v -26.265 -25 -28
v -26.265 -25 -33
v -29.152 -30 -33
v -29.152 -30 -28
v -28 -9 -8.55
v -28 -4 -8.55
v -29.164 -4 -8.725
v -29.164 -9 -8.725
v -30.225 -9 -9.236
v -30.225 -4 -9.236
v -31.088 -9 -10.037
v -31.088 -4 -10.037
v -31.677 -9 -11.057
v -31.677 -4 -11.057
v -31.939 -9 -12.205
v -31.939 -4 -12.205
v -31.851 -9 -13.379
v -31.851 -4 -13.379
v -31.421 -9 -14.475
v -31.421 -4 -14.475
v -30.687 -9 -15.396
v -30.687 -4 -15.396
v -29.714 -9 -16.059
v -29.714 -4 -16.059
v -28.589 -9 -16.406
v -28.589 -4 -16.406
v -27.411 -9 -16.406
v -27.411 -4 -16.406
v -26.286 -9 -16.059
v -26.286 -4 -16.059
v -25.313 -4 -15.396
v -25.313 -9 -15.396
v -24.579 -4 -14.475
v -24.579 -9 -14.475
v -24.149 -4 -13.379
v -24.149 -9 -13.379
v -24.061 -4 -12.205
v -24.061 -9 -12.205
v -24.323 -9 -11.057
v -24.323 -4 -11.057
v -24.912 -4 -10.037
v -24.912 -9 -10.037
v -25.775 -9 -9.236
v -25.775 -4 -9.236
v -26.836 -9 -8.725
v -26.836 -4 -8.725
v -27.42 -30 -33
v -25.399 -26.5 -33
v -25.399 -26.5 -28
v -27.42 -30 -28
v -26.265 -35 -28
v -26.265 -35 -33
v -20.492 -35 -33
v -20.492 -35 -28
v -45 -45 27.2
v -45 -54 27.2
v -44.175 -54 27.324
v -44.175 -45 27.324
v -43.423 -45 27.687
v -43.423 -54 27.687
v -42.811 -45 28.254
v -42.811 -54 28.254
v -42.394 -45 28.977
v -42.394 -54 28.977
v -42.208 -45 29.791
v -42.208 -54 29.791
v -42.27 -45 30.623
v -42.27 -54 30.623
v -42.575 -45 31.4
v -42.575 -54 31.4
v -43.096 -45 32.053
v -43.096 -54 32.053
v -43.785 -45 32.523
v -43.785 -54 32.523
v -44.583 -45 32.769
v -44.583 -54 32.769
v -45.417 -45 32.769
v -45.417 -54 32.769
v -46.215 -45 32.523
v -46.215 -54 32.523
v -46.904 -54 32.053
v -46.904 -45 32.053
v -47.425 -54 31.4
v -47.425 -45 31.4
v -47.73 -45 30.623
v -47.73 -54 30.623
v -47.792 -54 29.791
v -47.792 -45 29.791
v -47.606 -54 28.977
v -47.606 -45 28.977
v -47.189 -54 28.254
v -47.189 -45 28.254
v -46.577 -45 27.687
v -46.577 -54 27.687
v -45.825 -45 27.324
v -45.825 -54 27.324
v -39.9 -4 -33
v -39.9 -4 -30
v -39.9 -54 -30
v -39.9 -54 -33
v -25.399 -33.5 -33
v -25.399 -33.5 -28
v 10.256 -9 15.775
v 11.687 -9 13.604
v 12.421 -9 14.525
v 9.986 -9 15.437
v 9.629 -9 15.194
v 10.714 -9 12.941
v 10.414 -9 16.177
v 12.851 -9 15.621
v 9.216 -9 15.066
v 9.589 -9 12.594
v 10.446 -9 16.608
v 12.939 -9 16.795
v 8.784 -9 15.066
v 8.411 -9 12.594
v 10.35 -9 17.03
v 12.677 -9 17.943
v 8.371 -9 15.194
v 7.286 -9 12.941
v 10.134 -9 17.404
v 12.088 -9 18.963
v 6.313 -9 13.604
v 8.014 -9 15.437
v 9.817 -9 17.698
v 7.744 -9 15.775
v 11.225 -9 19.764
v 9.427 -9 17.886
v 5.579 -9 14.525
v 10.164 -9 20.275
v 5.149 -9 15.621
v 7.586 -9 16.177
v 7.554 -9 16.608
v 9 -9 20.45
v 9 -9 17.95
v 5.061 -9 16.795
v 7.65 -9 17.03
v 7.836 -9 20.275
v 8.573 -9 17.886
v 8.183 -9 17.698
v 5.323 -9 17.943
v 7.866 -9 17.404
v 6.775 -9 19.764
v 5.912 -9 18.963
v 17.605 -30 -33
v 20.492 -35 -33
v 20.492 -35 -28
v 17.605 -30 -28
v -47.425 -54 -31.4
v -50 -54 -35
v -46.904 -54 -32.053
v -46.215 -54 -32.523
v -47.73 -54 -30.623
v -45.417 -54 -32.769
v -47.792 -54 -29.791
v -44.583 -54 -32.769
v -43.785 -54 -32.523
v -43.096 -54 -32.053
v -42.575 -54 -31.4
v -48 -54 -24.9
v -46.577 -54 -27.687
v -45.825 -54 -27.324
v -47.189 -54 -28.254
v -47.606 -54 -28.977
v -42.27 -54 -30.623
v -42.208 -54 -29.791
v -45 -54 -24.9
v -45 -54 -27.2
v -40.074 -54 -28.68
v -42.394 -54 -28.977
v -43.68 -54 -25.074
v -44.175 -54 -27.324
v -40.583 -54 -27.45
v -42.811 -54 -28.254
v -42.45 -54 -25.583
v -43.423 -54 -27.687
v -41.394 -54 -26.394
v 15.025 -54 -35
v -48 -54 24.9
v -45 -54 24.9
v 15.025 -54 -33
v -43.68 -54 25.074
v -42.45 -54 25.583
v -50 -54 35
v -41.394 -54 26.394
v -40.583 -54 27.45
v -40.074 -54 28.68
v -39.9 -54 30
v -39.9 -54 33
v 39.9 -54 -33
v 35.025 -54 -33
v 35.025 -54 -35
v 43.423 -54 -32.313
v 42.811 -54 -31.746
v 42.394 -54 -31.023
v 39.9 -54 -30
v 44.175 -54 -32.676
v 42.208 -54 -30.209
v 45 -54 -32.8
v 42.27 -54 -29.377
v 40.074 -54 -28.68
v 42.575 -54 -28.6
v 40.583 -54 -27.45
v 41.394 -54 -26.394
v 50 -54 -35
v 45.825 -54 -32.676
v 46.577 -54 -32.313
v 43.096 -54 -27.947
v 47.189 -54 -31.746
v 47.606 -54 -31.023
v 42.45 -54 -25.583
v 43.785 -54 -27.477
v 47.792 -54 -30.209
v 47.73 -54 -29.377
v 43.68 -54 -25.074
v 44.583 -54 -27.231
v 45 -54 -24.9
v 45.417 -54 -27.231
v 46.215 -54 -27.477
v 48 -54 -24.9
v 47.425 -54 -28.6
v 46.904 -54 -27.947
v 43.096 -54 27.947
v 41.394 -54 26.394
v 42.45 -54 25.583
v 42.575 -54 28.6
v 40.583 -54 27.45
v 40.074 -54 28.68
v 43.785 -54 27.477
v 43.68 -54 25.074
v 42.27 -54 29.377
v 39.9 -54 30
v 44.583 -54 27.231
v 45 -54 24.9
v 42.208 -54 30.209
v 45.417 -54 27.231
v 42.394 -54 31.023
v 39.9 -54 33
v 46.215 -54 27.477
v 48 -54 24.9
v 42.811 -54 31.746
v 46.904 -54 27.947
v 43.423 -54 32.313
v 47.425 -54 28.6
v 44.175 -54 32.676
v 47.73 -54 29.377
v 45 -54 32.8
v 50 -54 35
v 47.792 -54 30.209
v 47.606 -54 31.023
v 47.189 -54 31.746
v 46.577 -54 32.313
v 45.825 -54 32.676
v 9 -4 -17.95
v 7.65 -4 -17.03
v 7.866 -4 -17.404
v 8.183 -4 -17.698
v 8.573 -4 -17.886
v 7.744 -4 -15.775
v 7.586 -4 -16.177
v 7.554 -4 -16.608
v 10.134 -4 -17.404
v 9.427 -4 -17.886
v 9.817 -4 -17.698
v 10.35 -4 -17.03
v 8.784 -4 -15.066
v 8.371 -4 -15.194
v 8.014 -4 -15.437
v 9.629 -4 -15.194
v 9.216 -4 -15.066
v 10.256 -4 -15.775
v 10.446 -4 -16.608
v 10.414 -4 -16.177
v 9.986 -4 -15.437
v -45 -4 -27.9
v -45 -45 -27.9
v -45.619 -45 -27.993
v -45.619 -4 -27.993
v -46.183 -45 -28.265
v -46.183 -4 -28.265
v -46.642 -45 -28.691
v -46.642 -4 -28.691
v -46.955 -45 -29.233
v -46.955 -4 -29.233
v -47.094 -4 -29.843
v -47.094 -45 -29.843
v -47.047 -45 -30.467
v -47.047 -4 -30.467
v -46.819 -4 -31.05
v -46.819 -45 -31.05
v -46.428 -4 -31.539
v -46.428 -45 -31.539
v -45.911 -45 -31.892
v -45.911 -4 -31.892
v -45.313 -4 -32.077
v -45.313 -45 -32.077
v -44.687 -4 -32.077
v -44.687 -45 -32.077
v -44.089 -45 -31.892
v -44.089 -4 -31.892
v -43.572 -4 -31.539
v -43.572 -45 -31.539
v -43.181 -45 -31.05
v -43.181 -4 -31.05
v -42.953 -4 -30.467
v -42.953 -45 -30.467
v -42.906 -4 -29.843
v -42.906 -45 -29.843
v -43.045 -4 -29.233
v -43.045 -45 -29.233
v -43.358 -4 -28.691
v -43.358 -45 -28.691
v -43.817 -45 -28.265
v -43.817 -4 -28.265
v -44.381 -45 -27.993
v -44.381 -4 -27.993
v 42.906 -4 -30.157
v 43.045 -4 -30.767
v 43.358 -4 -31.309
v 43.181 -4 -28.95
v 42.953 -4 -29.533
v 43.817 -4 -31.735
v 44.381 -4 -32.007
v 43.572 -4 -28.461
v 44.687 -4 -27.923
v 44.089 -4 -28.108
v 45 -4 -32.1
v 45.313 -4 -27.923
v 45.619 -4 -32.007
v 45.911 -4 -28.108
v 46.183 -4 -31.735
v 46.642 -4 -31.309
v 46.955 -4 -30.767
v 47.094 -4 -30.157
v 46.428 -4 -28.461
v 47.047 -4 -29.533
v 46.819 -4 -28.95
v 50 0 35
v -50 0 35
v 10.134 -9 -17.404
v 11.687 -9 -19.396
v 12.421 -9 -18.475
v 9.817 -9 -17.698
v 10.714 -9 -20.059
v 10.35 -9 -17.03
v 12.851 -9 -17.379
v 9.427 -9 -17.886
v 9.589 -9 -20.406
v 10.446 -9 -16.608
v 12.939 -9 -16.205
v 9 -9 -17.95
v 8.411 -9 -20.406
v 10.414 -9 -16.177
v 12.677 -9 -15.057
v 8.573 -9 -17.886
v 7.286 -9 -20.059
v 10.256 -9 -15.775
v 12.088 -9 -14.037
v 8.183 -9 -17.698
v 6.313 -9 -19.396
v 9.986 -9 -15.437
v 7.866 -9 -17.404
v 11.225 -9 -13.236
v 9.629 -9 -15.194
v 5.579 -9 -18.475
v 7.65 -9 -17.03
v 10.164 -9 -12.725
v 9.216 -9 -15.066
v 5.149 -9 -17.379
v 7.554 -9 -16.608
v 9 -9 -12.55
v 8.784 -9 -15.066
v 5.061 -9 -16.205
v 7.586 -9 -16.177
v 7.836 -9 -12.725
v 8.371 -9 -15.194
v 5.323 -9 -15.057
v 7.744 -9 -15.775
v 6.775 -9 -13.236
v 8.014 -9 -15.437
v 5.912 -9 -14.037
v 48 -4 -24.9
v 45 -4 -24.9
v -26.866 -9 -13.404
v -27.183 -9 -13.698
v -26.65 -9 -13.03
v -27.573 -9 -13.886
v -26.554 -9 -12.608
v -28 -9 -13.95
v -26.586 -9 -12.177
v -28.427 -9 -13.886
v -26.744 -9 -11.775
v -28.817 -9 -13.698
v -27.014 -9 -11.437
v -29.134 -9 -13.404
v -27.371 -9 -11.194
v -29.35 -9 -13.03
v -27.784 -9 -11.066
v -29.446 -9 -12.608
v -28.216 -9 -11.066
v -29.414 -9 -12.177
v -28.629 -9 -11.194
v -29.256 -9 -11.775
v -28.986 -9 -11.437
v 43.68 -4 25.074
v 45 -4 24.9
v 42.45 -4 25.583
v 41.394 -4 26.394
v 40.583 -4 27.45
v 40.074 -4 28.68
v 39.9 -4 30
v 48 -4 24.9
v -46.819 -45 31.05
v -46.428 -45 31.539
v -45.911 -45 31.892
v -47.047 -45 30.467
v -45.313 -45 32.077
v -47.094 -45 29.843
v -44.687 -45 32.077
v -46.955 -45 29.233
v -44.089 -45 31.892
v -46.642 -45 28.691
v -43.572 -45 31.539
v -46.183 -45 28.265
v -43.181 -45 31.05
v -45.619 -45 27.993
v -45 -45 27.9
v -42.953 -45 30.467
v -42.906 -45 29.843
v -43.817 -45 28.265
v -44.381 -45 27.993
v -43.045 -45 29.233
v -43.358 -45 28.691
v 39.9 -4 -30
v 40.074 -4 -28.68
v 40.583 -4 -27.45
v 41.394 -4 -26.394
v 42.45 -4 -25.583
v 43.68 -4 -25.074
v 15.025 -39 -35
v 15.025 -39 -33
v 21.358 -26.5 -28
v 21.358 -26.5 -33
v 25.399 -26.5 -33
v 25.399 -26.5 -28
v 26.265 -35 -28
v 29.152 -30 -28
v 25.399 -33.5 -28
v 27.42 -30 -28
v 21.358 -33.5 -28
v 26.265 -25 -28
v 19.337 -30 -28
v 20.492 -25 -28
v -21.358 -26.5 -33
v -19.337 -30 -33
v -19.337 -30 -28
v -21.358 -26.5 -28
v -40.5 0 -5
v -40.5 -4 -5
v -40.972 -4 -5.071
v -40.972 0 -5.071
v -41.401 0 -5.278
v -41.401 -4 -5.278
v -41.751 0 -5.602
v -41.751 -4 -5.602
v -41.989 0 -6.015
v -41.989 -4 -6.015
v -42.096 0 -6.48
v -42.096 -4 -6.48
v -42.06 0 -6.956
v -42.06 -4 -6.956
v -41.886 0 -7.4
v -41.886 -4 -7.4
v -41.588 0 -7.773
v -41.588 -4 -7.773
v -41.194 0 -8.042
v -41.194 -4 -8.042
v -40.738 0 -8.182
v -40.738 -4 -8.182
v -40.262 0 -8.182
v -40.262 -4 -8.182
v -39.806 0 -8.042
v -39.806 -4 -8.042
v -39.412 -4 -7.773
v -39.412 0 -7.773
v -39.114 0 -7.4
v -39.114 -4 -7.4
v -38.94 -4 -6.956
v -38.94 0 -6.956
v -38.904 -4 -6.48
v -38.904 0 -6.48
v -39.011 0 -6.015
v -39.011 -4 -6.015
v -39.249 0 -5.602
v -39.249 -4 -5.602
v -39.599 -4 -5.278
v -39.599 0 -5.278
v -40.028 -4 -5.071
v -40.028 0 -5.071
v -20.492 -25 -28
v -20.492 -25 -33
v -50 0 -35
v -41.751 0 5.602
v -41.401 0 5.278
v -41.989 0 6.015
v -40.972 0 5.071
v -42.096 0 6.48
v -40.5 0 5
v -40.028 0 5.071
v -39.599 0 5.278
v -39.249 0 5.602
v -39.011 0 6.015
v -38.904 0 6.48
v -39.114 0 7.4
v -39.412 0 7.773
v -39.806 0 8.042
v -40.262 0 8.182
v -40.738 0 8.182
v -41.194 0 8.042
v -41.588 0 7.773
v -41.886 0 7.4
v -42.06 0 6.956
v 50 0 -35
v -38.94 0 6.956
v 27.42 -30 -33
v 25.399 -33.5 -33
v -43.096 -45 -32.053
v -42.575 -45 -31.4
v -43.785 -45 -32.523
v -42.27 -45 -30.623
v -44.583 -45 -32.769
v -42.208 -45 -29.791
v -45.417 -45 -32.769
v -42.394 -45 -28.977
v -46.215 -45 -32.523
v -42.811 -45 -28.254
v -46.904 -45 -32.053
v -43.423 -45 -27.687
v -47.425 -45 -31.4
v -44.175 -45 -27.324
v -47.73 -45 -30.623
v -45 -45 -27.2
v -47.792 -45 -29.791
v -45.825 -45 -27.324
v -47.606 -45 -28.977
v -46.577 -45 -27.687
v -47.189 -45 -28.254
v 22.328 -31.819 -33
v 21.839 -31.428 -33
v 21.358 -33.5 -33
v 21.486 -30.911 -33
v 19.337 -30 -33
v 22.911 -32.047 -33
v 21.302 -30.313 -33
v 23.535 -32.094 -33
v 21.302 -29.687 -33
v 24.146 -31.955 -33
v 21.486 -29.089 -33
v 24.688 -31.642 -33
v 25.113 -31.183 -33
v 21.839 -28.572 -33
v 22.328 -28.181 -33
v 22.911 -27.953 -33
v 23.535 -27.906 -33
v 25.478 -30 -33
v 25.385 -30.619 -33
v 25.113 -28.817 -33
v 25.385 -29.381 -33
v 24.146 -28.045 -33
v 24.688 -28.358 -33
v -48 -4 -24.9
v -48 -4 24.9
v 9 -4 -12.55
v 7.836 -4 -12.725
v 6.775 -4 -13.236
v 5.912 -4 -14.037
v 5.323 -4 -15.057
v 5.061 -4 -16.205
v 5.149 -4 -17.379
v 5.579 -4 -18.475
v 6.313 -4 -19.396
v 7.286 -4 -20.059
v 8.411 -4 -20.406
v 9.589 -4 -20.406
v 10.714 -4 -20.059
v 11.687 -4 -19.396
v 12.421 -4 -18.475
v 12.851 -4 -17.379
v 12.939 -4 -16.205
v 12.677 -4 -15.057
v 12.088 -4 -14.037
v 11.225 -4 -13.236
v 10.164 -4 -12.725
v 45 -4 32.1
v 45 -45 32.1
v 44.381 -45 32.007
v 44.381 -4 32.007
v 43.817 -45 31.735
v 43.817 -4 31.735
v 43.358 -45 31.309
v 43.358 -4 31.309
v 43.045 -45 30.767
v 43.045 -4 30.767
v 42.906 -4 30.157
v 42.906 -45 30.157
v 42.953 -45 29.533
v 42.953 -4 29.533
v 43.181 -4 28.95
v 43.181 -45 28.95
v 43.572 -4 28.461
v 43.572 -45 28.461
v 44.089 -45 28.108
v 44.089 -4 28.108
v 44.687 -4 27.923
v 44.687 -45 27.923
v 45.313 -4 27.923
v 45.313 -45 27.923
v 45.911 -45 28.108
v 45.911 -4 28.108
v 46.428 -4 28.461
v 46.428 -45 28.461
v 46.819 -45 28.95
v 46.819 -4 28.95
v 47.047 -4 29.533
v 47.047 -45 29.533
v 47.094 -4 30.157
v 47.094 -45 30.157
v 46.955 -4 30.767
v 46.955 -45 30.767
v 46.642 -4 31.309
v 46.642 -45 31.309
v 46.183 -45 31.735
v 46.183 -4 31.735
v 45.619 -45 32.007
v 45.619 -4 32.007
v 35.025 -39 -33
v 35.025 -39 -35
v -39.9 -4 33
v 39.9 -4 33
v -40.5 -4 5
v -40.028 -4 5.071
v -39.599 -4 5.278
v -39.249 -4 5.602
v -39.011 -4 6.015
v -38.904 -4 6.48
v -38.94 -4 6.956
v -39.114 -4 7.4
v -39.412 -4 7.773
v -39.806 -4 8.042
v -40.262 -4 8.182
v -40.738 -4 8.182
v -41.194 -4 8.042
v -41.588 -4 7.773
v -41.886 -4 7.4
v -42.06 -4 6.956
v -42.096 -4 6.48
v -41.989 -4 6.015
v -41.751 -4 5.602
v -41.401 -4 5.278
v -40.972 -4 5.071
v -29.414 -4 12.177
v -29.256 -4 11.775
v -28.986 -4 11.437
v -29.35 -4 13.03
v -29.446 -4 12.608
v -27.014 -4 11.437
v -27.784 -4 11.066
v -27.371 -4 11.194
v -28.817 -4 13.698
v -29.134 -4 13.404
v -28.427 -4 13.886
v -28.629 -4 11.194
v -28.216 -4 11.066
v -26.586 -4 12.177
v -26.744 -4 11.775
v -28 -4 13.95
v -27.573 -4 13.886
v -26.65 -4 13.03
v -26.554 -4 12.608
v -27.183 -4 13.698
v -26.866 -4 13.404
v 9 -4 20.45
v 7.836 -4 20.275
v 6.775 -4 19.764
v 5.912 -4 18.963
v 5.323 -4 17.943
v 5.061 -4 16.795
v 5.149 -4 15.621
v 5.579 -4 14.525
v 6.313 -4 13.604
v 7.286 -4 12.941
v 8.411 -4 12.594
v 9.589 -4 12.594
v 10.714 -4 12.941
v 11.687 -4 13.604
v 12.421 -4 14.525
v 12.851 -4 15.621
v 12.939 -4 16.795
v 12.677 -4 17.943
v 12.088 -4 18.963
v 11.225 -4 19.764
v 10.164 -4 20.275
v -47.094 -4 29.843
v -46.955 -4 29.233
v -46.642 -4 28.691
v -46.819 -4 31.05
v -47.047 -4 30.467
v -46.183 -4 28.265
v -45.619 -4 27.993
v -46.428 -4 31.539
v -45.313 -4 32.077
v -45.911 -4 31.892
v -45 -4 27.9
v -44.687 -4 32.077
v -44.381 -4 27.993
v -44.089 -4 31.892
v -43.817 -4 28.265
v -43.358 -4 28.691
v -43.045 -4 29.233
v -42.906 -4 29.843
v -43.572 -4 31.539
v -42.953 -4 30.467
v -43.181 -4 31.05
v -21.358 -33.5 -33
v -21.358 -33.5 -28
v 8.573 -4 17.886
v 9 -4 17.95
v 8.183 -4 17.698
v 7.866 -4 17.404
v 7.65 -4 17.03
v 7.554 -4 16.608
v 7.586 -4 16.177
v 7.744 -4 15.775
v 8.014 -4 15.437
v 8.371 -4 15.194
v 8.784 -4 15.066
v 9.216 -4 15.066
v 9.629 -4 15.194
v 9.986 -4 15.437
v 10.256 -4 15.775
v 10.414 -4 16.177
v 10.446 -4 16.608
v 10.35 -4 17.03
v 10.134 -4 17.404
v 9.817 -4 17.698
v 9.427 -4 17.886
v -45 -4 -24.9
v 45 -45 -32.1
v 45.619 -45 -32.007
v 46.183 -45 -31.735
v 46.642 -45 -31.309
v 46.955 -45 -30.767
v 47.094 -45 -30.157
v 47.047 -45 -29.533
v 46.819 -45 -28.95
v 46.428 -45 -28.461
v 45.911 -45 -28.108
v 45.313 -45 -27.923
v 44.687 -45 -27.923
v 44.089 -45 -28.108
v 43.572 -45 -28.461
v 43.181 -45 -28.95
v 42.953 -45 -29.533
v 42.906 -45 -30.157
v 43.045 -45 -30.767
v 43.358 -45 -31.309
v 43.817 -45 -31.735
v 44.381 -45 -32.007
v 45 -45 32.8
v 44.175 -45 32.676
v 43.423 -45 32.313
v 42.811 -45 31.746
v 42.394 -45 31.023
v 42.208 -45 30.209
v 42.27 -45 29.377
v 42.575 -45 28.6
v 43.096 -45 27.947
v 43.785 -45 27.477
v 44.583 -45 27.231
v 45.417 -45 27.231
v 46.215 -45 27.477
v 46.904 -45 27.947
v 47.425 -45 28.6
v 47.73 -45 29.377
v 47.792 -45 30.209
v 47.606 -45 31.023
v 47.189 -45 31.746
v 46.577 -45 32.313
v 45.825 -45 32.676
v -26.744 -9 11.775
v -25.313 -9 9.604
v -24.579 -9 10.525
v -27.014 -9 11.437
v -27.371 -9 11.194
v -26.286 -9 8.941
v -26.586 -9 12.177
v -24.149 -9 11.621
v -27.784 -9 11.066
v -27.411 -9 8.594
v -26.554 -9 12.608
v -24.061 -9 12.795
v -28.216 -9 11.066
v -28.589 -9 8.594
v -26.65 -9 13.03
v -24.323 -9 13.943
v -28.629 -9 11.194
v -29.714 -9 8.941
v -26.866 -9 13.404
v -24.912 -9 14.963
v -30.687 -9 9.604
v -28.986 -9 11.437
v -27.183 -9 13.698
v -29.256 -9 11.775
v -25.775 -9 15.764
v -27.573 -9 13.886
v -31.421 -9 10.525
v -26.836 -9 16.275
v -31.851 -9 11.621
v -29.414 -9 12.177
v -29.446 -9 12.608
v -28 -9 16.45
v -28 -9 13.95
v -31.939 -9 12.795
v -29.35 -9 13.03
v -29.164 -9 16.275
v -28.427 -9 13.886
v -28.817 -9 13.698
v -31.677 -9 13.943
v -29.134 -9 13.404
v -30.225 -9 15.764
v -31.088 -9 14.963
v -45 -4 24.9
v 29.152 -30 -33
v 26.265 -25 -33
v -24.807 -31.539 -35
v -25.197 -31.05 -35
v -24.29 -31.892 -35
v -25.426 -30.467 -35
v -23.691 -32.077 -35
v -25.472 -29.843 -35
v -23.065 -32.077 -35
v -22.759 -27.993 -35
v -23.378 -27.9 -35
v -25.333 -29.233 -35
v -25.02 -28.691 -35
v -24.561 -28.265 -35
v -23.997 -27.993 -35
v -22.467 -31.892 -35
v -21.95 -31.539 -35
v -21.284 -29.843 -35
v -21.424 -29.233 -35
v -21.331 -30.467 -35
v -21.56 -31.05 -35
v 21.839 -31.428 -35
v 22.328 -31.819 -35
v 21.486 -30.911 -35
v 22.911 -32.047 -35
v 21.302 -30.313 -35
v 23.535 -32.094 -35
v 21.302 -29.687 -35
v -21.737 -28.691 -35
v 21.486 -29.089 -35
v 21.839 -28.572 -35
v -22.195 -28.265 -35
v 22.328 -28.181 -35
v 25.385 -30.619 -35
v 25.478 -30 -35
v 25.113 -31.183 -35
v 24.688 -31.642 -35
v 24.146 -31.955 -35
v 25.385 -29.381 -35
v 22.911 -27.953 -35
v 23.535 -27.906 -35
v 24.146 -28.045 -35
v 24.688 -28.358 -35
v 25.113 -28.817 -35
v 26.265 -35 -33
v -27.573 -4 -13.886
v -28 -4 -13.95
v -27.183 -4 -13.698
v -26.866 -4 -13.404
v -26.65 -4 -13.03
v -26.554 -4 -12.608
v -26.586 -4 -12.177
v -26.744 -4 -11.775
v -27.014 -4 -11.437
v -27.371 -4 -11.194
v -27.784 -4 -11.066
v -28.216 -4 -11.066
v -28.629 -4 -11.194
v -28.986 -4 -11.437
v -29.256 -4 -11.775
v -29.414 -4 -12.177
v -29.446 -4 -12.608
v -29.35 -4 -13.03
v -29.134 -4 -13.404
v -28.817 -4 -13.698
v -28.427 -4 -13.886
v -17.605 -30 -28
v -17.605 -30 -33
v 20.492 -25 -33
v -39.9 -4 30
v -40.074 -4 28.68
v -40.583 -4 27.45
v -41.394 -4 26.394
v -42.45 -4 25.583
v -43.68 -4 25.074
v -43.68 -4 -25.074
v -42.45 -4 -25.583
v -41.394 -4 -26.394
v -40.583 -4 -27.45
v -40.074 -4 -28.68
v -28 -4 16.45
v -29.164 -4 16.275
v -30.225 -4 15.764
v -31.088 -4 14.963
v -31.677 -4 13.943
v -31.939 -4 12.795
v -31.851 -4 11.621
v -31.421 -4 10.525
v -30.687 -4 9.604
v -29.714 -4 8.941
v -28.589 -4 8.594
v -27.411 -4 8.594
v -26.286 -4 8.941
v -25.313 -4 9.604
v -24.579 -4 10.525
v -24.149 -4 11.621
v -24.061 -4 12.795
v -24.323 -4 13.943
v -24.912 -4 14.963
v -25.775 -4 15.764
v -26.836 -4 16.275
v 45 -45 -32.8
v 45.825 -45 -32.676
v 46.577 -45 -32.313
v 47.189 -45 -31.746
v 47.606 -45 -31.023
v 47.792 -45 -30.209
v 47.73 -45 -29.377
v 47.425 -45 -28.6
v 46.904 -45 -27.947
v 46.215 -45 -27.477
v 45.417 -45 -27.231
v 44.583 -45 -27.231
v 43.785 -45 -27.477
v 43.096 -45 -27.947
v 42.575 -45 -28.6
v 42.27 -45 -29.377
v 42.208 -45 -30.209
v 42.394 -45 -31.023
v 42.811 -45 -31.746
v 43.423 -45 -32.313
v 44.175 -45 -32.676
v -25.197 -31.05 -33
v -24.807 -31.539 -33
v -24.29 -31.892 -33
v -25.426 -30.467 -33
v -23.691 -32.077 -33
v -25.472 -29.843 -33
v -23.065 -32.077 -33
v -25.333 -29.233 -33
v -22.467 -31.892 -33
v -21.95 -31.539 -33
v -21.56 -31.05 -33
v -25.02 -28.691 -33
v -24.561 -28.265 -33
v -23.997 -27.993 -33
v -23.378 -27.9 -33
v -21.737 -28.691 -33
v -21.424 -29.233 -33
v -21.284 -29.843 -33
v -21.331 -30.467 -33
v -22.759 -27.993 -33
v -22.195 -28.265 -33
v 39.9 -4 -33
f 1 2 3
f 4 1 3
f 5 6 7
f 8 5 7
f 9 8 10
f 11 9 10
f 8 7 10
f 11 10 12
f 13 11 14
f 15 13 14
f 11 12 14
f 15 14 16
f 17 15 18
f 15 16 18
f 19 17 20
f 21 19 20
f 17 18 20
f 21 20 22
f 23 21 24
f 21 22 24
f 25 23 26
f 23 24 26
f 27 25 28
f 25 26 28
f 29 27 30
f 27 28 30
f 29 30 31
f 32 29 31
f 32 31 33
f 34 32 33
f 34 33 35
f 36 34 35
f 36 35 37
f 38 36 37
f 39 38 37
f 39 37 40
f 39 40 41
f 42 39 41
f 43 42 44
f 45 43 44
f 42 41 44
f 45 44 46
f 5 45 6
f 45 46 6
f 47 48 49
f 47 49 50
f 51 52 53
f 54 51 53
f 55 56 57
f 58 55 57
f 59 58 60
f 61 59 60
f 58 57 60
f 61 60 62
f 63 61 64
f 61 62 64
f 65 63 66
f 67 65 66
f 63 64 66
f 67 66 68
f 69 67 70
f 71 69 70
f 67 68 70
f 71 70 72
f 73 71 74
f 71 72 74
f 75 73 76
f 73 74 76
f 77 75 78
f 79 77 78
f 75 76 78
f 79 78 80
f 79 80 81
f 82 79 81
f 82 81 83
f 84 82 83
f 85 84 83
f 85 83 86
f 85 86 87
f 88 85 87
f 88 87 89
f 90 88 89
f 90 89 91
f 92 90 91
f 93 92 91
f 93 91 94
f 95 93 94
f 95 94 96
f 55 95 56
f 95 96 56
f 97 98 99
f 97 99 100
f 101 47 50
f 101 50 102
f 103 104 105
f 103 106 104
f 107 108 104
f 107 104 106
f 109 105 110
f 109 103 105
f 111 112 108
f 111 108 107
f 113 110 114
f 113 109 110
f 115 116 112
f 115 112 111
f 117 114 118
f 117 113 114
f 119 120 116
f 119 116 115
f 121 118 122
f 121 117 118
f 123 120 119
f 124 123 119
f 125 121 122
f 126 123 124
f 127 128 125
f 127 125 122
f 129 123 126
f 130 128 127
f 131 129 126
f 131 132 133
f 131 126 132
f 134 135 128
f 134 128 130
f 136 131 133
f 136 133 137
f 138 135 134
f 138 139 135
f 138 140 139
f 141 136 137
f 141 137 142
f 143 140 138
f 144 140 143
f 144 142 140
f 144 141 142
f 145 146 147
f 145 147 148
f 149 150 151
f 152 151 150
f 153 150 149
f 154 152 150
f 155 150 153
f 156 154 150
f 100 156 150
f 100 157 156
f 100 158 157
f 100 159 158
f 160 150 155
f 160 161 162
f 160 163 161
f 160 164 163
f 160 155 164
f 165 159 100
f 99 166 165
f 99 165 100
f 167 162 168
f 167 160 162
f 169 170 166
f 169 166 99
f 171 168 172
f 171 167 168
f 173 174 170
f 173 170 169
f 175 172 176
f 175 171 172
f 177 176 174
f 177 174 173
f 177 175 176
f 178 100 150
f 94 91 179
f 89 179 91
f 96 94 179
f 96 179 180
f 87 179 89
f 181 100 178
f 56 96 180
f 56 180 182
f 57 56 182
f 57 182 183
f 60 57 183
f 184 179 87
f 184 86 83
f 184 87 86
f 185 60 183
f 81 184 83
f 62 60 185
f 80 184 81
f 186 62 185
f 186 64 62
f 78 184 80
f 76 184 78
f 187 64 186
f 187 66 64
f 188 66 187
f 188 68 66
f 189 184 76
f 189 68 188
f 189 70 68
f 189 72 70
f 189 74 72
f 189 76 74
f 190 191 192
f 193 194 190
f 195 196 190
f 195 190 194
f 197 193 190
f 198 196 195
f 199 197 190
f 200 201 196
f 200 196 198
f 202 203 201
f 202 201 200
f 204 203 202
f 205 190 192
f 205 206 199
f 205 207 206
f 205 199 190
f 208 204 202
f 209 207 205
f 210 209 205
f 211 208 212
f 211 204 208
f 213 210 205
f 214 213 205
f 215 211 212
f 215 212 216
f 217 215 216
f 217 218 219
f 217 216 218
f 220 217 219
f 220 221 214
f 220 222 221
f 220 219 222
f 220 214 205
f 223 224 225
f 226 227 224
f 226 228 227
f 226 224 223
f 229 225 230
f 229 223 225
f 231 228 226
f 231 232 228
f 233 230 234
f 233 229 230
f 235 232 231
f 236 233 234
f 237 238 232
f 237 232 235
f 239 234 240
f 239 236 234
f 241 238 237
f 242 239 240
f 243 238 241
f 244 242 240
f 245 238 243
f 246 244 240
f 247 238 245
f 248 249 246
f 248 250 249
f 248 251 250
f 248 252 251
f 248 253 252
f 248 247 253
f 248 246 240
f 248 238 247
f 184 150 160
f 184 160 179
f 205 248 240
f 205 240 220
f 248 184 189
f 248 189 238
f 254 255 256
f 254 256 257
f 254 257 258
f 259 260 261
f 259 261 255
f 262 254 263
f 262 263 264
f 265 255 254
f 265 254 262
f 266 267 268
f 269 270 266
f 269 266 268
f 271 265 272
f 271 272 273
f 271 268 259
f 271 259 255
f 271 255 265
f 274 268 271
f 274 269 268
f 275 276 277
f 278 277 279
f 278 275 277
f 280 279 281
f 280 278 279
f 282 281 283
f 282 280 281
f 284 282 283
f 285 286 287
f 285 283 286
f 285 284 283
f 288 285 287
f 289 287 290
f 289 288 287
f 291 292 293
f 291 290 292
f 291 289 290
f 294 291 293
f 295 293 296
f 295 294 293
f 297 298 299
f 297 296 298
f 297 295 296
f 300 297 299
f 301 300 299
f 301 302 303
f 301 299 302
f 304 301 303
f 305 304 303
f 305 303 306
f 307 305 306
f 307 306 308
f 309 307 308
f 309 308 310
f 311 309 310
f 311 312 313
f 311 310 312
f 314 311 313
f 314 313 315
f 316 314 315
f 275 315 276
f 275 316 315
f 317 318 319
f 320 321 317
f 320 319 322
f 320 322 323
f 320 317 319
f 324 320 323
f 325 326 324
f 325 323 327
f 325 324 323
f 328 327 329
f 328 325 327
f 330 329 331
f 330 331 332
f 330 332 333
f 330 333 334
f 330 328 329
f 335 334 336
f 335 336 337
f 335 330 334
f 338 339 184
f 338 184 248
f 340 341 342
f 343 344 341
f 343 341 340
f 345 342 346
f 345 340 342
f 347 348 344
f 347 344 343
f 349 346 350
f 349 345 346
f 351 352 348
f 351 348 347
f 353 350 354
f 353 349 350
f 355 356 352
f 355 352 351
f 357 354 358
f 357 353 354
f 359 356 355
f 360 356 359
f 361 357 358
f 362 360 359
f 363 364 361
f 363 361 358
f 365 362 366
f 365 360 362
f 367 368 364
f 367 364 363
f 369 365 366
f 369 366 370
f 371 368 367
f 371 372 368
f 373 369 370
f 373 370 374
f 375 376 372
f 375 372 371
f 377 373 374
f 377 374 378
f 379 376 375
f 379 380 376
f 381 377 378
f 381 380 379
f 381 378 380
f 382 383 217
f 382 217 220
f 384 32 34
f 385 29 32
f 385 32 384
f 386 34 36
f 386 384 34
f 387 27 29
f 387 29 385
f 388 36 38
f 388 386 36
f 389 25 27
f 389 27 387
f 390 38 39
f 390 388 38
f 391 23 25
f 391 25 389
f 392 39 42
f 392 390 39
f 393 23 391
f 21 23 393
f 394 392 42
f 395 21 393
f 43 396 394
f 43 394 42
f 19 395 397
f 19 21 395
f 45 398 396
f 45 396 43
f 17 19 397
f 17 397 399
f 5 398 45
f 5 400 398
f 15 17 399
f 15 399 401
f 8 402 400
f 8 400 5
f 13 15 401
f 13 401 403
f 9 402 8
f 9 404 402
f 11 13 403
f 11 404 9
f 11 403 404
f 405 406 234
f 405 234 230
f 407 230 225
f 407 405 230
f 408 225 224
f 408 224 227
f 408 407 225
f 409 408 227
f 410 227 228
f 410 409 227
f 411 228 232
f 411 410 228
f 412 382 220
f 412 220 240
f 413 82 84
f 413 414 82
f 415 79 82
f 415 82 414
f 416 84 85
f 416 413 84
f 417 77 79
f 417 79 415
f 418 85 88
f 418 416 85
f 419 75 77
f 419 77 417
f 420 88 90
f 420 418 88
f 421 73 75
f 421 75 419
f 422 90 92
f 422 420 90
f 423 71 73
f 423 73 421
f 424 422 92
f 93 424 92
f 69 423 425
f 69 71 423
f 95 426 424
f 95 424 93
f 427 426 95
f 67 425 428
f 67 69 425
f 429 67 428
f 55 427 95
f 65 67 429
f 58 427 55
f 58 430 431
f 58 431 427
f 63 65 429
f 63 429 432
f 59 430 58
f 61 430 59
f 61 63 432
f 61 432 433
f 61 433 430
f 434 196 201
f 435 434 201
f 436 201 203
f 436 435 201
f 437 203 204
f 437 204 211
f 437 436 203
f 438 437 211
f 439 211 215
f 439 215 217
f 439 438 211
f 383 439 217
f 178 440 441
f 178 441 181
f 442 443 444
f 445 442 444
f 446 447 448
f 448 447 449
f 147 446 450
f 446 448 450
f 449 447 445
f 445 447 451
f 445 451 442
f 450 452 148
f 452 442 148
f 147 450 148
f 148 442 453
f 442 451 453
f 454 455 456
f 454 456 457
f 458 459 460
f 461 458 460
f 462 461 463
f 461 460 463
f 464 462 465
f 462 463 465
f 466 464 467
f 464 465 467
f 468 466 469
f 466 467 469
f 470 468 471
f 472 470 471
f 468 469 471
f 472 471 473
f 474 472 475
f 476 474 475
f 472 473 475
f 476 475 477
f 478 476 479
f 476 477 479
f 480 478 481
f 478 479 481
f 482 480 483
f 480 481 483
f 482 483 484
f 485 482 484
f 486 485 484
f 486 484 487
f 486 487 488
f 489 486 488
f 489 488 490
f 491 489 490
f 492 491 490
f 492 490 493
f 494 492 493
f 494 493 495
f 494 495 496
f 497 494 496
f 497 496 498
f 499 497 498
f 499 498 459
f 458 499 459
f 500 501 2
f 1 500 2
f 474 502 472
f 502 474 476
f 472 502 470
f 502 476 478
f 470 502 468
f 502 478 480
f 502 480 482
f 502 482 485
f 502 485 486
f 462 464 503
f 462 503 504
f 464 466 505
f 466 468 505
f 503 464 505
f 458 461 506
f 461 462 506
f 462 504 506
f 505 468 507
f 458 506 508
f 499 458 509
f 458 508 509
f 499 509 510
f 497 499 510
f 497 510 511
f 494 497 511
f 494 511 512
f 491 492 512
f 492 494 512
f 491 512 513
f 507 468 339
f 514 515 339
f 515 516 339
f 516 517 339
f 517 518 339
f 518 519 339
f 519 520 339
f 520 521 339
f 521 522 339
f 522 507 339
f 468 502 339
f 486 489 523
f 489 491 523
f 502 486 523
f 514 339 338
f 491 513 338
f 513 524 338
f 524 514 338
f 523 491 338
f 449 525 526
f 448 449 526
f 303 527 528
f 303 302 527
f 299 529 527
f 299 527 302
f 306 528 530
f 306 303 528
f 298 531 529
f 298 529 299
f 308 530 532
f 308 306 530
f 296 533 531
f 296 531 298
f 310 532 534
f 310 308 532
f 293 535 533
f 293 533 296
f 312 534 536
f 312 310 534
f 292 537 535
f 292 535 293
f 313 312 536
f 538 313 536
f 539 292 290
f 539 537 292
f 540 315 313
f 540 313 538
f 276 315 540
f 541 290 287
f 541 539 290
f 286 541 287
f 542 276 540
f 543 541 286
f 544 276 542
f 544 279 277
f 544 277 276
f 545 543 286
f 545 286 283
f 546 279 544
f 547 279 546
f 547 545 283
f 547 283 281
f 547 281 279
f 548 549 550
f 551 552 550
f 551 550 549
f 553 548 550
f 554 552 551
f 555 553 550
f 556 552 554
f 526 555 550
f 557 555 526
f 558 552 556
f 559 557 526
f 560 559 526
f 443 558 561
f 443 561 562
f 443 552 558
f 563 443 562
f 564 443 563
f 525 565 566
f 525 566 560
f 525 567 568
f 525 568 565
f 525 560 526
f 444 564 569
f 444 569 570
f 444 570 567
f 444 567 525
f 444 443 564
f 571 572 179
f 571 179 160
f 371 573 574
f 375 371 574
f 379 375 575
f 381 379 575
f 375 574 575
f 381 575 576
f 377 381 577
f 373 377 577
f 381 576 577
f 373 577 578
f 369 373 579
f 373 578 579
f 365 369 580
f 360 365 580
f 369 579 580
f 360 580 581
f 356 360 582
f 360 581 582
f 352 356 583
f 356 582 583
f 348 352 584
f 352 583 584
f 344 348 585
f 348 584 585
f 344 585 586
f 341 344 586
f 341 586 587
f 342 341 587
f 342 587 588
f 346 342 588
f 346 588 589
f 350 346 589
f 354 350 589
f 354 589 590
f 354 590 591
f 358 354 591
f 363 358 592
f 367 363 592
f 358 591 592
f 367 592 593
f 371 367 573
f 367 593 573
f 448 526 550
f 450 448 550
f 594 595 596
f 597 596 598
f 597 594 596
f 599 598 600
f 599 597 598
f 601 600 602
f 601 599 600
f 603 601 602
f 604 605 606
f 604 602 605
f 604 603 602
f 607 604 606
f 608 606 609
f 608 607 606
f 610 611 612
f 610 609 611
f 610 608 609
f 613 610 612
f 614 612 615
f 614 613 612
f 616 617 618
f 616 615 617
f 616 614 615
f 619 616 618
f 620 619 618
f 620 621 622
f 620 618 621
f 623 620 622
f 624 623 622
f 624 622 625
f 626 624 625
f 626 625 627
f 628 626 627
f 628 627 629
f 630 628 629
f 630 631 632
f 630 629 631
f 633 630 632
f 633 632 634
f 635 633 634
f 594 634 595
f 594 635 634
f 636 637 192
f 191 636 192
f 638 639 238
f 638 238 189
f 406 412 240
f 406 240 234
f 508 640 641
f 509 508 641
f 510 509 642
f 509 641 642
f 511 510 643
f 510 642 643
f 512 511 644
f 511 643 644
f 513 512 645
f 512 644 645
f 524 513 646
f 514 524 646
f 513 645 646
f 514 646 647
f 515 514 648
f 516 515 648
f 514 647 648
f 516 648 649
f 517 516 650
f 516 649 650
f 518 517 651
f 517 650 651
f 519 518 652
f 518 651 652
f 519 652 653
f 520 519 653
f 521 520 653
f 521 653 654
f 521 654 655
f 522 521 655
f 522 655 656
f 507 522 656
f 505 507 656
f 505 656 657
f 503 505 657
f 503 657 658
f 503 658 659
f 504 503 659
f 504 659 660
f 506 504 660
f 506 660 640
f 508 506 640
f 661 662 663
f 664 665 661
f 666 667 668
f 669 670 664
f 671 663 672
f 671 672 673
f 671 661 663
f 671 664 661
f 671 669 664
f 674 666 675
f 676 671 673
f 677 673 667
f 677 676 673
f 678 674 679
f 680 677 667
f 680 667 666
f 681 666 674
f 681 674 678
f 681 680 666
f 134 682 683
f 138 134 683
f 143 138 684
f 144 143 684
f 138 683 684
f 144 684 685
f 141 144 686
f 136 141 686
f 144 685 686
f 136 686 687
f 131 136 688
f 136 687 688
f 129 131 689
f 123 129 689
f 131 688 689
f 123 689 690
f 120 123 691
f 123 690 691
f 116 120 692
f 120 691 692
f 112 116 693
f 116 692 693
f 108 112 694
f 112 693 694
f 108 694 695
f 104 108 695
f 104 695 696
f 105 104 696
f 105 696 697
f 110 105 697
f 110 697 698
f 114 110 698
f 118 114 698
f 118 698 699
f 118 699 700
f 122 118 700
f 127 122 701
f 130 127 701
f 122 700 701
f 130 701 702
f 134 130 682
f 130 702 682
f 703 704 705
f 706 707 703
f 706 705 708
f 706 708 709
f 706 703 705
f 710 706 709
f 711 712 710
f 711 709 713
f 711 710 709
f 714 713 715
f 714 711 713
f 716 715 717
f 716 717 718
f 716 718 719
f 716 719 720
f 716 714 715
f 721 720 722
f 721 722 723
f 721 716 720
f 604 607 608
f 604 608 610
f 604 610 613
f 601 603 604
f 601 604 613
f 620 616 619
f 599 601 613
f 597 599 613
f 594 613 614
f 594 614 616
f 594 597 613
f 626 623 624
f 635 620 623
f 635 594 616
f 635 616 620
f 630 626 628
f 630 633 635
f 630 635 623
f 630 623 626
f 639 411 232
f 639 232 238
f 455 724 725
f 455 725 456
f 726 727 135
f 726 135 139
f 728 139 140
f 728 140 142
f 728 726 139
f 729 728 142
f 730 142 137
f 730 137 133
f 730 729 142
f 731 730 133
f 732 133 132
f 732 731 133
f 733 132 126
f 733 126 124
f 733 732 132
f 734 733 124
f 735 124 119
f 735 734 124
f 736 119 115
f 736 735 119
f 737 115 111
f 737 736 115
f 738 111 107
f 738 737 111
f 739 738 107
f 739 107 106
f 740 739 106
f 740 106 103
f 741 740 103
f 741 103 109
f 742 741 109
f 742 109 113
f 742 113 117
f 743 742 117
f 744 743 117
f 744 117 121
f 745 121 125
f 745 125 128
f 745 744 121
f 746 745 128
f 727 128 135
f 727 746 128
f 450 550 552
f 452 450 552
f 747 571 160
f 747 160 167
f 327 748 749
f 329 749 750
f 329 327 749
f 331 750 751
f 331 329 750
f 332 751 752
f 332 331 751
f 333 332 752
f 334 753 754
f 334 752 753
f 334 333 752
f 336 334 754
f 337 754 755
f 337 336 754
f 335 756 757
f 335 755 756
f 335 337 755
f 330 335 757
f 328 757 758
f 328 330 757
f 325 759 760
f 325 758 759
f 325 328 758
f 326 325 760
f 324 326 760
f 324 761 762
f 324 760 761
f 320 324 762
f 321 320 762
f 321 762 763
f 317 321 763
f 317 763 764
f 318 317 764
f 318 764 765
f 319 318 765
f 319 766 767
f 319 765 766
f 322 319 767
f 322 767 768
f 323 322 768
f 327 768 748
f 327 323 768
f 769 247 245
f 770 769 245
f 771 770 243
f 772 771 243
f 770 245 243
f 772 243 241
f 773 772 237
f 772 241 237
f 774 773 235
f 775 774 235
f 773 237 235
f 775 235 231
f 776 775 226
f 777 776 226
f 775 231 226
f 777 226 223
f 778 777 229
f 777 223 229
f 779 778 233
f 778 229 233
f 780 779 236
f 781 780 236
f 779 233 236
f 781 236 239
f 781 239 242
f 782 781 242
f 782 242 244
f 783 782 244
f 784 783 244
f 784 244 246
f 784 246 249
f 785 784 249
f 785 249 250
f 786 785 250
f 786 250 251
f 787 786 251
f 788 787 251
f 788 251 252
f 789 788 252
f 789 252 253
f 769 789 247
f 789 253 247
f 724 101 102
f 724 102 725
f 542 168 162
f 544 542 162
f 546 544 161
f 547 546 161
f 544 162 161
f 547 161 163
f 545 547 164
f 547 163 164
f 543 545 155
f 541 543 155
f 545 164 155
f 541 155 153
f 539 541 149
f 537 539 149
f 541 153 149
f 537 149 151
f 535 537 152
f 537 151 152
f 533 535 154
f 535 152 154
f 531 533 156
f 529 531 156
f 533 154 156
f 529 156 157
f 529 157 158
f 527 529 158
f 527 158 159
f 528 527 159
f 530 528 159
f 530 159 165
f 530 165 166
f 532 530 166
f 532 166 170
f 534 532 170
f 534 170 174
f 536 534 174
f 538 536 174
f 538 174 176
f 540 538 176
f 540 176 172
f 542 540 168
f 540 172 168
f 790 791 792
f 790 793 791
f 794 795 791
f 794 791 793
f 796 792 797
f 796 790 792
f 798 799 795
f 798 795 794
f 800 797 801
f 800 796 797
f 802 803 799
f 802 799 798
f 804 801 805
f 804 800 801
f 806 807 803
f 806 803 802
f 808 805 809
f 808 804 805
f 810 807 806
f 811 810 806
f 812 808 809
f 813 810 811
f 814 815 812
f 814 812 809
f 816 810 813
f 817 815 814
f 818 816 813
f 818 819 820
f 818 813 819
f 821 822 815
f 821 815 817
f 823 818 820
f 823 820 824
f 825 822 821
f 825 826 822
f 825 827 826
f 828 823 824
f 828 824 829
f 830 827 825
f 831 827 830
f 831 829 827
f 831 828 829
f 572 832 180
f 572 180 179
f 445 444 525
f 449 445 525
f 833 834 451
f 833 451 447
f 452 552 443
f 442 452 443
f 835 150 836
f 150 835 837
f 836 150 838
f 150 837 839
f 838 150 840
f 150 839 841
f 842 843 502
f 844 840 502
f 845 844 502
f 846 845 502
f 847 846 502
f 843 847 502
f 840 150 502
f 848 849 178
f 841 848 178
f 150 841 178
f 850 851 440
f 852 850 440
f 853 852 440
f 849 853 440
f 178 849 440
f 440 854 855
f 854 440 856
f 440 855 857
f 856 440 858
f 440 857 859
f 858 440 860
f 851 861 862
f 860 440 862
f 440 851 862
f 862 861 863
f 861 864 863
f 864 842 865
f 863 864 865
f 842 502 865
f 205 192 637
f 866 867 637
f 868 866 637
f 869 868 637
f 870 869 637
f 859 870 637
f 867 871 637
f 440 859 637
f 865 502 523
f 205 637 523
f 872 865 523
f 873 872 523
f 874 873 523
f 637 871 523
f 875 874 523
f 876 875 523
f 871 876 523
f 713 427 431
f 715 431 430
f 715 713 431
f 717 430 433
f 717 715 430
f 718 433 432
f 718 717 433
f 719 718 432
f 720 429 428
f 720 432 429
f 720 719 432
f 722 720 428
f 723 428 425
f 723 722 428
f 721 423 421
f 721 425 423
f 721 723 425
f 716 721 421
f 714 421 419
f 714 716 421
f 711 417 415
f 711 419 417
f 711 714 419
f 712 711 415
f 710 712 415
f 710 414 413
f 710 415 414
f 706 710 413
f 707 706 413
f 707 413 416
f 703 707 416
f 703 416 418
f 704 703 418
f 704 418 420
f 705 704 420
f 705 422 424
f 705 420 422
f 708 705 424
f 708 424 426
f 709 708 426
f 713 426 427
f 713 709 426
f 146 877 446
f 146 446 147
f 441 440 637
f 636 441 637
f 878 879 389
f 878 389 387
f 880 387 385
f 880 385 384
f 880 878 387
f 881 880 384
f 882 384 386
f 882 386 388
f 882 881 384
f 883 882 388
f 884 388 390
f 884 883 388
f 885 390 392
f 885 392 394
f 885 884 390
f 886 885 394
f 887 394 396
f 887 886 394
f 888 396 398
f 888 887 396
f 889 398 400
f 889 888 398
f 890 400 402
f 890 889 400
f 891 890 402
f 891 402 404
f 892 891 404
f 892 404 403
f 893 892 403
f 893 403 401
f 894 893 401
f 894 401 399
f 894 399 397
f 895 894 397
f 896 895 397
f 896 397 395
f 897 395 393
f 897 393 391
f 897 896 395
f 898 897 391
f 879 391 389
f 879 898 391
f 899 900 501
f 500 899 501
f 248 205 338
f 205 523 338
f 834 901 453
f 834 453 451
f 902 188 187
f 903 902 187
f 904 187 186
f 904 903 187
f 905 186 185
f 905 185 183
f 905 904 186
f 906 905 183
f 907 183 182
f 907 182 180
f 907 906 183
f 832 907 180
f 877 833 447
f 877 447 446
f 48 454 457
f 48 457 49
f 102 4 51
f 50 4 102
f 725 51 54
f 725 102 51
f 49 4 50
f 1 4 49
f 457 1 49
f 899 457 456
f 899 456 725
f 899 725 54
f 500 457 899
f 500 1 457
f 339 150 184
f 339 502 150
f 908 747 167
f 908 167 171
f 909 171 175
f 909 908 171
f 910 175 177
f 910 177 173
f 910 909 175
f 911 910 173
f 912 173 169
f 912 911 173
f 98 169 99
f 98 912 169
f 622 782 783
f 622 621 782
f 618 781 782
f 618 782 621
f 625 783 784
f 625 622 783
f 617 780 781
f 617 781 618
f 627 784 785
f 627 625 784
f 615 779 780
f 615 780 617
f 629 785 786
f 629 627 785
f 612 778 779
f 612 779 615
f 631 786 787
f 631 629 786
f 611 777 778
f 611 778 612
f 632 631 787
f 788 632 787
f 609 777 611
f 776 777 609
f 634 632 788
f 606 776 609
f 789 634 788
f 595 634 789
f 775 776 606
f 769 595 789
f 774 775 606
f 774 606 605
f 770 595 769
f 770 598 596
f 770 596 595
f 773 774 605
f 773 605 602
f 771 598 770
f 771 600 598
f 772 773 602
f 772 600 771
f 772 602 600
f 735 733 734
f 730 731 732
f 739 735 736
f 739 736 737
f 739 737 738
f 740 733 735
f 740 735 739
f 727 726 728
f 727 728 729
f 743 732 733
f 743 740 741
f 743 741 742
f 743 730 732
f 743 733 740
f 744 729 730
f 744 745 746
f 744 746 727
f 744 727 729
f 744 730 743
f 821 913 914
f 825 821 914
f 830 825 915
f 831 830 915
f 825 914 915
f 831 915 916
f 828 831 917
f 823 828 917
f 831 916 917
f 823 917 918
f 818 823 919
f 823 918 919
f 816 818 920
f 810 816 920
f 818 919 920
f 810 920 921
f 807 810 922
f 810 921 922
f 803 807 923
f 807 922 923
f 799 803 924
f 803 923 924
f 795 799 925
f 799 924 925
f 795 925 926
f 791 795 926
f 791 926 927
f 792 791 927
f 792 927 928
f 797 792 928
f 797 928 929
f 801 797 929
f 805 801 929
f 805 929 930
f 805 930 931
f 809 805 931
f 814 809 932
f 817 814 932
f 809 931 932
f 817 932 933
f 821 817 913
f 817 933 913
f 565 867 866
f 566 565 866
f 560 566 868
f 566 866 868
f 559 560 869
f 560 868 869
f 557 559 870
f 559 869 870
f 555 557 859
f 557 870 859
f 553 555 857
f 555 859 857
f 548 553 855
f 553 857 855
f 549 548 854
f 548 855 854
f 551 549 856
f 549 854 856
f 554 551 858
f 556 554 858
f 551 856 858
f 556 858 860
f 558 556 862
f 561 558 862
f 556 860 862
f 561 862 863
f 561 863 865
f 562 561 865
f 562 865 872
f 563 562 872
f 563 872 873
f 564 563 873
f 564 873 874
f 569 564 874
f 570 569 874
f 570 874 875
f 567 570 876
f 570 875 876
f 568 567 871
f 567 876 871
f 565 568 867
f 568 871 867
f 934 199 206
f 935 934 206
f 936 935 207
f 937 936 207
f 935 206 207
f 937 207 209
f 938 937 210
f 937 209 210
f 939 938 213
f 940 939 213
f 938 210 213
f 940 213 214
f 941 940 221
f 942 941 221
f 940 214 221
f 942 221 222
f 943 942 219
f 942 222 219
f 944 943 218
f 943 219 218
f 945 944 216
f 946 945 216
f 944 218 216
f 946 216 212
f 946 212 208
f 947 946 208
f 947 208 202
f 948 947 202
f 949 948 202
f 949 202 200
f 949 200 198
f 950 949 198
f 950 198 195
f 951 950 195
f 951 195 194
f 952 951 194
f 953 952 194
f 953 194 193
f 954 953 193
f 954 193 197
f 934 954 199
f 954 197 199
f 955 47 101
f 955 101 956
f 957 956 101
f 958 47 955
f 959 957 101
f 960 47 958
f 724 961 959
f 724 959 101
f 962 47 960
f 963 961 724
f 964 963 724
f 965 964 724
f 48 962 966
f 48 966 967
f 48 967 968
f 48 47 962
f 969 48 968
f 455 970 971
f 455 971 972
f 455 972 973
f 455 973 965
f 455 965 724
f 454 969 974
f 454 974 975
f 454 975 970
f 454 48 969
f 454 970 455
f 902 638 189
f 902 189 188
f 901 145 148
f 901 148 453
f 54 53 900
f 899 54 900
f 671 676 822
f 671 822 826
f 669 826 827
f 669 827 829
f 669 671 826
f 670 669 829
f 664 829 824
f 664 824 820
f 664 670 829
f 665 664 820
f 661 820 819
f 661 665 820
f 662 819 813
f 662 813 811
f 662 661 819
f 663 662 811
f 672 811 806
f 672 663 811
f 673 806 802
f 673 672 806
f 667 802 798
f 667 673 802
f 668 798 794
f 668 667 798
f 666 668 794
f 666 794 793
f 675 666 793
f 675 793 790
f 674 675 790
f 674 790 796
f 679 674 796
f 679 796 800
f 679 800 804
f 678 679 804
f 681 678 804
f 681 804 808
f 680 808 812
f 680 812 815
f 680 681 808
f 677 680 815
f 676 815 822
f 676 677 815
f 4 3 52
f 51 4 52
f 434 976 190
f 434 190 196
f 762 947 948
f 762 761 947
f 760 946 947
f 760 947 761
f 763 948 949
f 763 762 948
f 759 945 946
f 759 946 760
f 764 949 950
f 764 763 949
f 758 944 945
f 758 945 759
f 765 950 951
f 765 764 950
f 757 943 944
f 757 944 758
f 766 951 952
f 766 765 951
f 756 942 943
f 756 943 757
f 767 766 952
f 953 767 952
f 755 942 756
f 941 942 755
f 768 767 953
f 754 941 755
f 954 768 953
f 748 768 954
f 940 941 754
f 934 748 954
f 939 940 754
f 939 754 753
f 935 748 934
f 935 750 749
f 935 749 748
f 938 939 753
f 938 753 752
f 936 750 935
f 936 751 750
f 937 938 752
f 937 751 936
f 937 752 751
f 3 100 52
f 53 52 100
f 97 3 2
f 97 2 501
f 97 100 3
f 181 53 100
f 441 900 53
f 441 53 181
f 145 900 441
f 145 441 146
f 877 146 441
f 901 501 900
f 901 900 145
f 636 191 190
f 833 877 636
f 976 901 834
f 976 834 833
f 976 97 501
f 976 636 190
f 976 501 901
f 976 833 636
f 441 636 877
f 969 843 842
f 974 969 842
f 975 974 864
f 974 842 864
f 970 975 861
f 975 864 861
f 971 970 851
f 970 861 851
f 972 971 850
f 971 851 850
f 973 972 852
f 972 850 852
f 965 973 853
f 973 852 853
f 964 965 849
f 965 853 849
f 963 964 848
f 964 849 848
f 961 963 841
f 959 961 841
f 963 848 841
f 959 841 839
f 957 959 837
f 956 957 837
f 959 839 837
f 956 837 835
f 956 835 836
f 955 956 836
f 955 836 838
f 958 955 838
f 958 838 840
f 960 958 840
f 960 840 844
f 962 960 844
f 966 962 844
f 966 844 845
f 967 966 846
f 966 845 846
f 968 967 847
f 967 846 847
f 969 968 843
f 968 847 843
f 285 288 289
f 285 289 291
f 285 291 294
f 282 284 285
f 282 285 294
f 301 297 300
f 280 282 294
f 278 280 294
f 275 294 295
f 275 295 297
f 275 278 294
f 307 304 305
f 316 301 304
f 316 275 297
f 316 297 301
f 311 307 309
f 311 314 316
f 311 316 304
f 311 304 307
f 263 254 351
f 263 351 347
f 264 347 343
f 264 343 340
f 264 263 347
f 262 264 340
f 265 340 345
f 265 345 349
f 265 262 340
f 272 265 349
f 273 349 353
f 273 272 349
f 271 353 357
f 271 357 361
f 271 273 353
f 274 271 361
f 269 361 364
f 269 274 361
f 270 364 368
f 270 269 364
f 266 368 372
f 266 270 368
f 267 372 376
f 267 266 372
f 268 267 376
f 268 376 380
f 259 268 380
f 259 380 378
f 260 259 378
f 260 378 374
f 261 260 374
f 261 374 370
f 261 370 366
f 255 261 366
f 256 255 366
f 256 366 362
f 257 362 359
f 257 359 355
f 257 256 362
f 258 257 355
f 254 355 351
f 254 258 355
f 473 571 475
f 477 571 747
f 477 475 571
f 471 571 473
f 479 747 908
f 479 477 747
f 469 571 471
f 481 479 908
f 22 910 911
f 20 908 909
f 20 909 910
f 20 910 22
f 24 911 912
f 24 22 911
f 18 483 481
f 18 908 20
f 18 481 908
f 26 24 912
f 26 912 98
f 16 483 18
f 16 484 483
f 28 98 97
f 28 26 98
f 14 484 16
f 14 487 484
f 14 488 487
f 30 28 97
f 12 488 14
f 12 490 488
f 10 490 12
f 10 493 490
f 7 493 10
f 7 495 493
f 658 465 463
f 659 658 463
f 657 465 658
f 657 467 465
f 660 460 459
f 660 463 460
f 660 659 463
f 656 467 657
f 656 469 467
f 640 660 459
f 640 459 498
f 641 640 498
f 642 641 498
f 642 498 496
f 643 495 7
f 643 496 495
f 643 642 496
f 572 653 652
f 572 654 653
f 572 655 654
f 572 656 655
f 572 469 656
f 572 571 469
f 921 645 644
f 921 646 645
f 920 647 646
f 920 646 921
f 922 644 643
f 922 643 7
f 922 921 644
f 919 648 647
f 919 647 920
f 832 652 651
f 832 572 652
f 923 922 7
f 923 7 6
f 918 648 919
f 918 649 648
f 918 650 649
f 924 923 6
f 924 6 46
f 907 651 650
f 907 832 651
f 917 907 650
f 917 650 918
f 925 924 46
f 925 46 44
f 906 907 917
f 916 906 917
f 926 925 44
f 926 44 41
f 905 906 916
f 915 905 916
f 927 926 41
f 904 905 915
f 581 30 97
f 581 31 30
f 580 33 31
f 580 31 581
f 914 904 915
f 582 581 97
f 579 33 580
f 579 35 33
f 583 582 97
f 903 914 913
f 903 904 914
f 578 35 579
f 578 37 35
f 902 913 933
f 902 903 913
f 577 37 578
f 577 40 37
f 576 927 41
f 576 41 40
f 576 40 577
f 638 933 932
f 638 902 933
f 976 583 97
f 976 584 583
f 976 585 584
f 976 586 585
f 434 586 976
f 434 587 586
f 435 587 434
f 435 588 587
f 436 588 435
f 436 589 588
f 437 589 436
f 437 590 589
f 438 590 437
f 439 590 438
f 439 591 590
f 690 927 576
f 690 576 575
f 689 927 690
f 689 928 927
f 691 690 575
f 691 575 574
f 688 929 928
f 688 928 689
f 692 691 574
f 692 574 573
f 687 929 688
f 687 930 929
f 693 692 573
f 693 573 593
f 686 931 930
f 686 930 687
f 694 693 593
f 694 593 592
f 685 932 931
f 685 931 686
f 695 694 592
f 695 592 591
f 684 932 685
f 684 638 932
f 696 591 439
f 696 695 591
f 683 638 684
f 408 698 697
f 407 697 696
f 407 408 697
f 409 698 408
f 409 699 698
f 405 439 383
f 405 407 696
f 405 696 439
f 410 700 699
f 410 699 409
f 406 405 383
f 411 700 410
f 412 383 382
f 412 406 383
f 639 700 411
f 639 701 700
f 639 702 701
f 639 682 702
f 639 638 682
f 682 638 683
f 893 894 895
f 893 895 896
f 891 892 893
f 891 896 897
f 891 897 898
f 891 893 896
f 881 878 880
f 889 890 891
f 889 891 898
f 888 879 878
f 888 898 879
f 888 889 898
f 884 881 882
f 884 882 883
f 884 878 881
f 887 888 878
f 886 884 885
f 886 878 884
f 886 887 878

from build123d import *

# Parameters (mm, degrees)
SKIZZE1_W                       = 100
SKIZZE1_H                       = 70
AUFSATZ_LINEAR_AUSTRAGEN1_DEPTH = 4
SKIZZE2_W                       = 100
SKIZZE2_H                       = 70
SKIZZE2_R                       = 2.1
AUFSATZ_LINEAR_AUSTRAGEN2_DEPTH = 50
SKIZZE3_R                       = 2.8
SCHNITT_LINEAR_AUSTRAGEN1_DEPTH = 9
SCHNITT_LINEAR_AUSTRAGEN3_REACH = 80.899
SKIZZE5_R                       = 1.6
SKIZZE6_R                       = 2.1
SKIZZE6_W                       = 20
SKIZZE6_H                       = 15
SCHNITT_LINEAR_AUSTRAGEN4_DEPTH = 2
AUFSATZ_LINEAR_AUSTRAGEN3_DEPTH = 5
SKETCH2_R                       = 3.95
SKETCH2_R_2                     = 1.45
BOSS_EXTRUDE1_DEPTH             = 5


with BuildPart() as part:
    # Skizze1 → Aufsatz-Linear austragen1 (new body)
    with BuildSketch(Plane.XZ):
        Rectangle(SKIZZE1_W, SKIZZE1_H)
    extrude(amount=AUFSATZ_LINEAR_AUSTRAGEN1_DEPTH)

    # Skizze2 → Aufsatz-Linear austragen2 (add)
    with BuildSketch(Plane.XZ.offset(4)):
        Rectangle(SKIZZE2_W, SKIZZE2_H)
        with Locations(Location((-45, 30, 0), (0, 0, 270))):
            Circle(SKIZZE2_R, mode=Mode.SUBTRACT)
        with Locations(Location((45, 30, 0), (0, 0, 90))):
            Circle(SKIZZE2_R, mode=Mode.SUBTRACT)
        with Locations(Location((45, -30, 0), (0, 0, 270))):
            Circle(SKIZZE2_R, mode=Mode.SUBTRACT)
        with Locations(Location((-45, -30, 0), (0, 0, 90))):
            Circle(SKIZZE2_R, mode=Mode.SUBTRACT)
        with BuildLine():
            Line((-48, 24.9), (-48, -24.9))
            Line((-48, -24.9), (-45, -24.9))
            ThreePointArc((-45, -24.9), (-41.393755416, -26.393755416), (-39.9, -30))
            Line((-39.9, -30), (-39.9, -33))
            Line((-39.9, -33), (39.9, -33))
            Line((39.9, -33), (39.9, -30))
            ThreePointArc((39.9, -30), (41.393755416, -26.393755416), (45, -24.9))
            Line((45, -24.9), (48, -24.9))
            Line((48, -24.9), (48, 24.9))
            Line((48, 24.9), (45, 24.9))
            ThreePointArc((45, 24.9), (41.393755416, 26.393755416), (39.9, 30))
            Line((39.9, 30), (39.9, 33))
            Line((39.9, 33), (-39.9, 33))
            Line((-39.9, 33), (-39.9, 30))
            ThreePointArc((-39.9, 30), (-41.393755416, 26.393755416), (-45, 24.9))
            Line((-45, 24.9), (-48, 24.9))
        make_face(mode=Mode.SUBTRACT)
    extrude(amount=AUFSATZ_LINEAR_AUSTRAGEN2_DEPTH)

    # Skizze3 → Schnitt-Linear austragen1 (cut)
    with BuildSketch(Plane.XZ.offset(54)):
        with Locations(Location((-45, 30, 0), (0, 0, 270))):
            Circle(SKIZZE3_R)
        with Locations(Location((45, 30, 0), (0, 0, 90))):
            Circle(SKIZZE3_R)
        with Locations(Location((45, -30, 0), (0, 0, 270))):
            Circle(SKIZZE3_R)
        with Locations(Location((-45, -30, 0), (0, 0, 90))):
            Circle(SKIZZE3_R)
    extrude(amount=-SCHNITT_LINEAR_AUSTRAGEN1_DEPTH, mode=Mode.SUBTRACT)

    # Skizze5 → Schnitt-Linear austragen3 (cut, up to next)
    with BuildSketch(Plane.XZ.offset(4), mode=Mode.PRIVATE) as schnitt_linear_austragen3_sk1:
        with Locations(Location((-40.5, 6.6, 0), (0, 0, 270))):
            Circle(SKIZZE5_R)
    schnitt_linear_austragen3_tool1 = extrude(schnitt_linear_austragen3_sk1.sketch, amount=-SCHNITT_LINEAR_AUSTRAGEN3_REACH, mode=Mode.PRIVATE) & part.part
    # Skizze5 → Schnitt-Linear austragen3 (cut, up to next)
    with BuildSketch(Plane.XZ.offset(4), mode=Mode.PRIVATE) as schnitt_linear_austragen3_sk2:
        with Locations(Location((-40.5, -6.6, 0), (0, 0, 90))):
            Circle(SKIZZE5_R)
    schnitt_linear_austragen3_tool2 = extrude(schnitt_linear_austragen3_sk2.sketch, amount=-SCHNITT_LINEAR_AUSTRAGEN3_REACH, mode=Mode.PRIVATE) & part.part
    add(schnitt_linear_austragen3_tool1.solids().sort_by_distance((-40.5, -4, 6.6))[0], mode=Mode.SUBTRACT)
    add(schnitt_linear_austragen3_tool2.solids().sort_by_distance((-40.5, -4, -6.6))[0], mode=Mode.SUBTRACT)

    # Skizze6 → Schnitt-Linear austragen4 (cut)
    with BuildSketch(Plane(origin=(0, 0, -35), x_dir=(1, 0, 0), z_dir=(0, 0, -1))):
        with Locations(Location((-23.378367252, 30, 0), (0, 0, 270))):
            Circle(SKIZZE6_R)
        with Locations((23.378367252, 30)):
            Circle(SKIZZE6_R)
        with Locations((25.02457838, 46.5)):
            Rectangle(SKIZZE6_W, SKIZZE6_H)
    extrude(amount=-SCHNITT_LINEAR_AUSTRAGEN4_DEPTH, mode=Mode.SUBTRACT)

    # Skizze7 → Aufsatz-Linear austragen3 (add)
    # profile 1 of 2: a face of its own
    with BuildSketch(Plane.XY.offset(-33)):
        Polygon((-17.604864561, -30), (-20.491615906, -25), (-26.265118598, -25), (-29.151869944, -30), (-26.265118598, -35), (-20.491615906, -35), align=None)
        Polygon((-19.336915368, -30), (-21.35764131, -26.5), (-25.399093195, -26.5), (-27.419819137, -30), (-25.399093195, -33.5), (-21.35764131, -33.5), align=None, mode=Mode.SUBTRACT)
    # profile 2 of 2: a face of its own
    with BuildSketch(Plane.XY.offset(-33)):
        Polygon((20.491615906, -35), (17.604864561, -30), (20.491615906, -25), (26.265118598, -25), (29.151869944, -30), (26.265118598, -35), align=None)
        Polygon((21.35764131, -33.5), (19.336915368, -30), (21.35764131, -26.5), (25.399093195, -26.5), (27.419819137, -30), (25.399093195, -33.5), align=None, mode=Mode.SUBTRACT)
    extrude(amount=AUFSATZ_LINEAR_AUSTRAGEN3_DEPTH)

    # Sketch2 → Boss-Extrude1 (add)
    # profile 1 of 4: a face of its own
    with BuildSketch(Plane.XZ.offset(4)):
        with Locations(Location((-28, -12.5, 0), (0, 0, 90))):
            Circle(SKETCH2_R)
        with Locations(Location((-28, -12.5, 0), (0, 0, 270))):
            Circle(SKETCH2_R_2, mode=Mode.SUBTRACT)
    # profile 2 of 4: a face of its own
    with BuildSketch(Plane.XZ.offset(4)):
        with Locations(Location((9, -16.5, 0), (0, 0, 90))):
            Circle(SKETCH2_R)
        with Locations(Location((9, -16.5, 0), (0, 0, 270))):
            Circle(SKETCH2_R_2, mode=Mode.SUBTRACT)
    # profile 3 of 4: a face of its own
    with BuildSketch(Plane.XZ.offset(4)):
        with Locations(Location((9, 16.5, 0), (0, 0, 90))):
            Circle(SKETCH2_R)
        with Locations(Location((9, 16.5, 0), (0, 0, 90))):
            Circle(SKETCH2_R_2, mode=Mode.SUBTRACT)
    # profile 4 of 4: a face of its own
    with BuildSketch(Plane.XZ.offset(4)):
        with Locations(Location((-28, 12.5, 0), (0, 0, 90))):
            Circle(SKETCH2_R)
        with Locations(Location((-28, 12.5, 0), (0, 0, 90))):
            Circle(SKETCH2_R_2, mode=Mode.SUBTRACT)
    extrude(amount=BOSS_EXTRUDE1_DEPTH)


solid = part.part
